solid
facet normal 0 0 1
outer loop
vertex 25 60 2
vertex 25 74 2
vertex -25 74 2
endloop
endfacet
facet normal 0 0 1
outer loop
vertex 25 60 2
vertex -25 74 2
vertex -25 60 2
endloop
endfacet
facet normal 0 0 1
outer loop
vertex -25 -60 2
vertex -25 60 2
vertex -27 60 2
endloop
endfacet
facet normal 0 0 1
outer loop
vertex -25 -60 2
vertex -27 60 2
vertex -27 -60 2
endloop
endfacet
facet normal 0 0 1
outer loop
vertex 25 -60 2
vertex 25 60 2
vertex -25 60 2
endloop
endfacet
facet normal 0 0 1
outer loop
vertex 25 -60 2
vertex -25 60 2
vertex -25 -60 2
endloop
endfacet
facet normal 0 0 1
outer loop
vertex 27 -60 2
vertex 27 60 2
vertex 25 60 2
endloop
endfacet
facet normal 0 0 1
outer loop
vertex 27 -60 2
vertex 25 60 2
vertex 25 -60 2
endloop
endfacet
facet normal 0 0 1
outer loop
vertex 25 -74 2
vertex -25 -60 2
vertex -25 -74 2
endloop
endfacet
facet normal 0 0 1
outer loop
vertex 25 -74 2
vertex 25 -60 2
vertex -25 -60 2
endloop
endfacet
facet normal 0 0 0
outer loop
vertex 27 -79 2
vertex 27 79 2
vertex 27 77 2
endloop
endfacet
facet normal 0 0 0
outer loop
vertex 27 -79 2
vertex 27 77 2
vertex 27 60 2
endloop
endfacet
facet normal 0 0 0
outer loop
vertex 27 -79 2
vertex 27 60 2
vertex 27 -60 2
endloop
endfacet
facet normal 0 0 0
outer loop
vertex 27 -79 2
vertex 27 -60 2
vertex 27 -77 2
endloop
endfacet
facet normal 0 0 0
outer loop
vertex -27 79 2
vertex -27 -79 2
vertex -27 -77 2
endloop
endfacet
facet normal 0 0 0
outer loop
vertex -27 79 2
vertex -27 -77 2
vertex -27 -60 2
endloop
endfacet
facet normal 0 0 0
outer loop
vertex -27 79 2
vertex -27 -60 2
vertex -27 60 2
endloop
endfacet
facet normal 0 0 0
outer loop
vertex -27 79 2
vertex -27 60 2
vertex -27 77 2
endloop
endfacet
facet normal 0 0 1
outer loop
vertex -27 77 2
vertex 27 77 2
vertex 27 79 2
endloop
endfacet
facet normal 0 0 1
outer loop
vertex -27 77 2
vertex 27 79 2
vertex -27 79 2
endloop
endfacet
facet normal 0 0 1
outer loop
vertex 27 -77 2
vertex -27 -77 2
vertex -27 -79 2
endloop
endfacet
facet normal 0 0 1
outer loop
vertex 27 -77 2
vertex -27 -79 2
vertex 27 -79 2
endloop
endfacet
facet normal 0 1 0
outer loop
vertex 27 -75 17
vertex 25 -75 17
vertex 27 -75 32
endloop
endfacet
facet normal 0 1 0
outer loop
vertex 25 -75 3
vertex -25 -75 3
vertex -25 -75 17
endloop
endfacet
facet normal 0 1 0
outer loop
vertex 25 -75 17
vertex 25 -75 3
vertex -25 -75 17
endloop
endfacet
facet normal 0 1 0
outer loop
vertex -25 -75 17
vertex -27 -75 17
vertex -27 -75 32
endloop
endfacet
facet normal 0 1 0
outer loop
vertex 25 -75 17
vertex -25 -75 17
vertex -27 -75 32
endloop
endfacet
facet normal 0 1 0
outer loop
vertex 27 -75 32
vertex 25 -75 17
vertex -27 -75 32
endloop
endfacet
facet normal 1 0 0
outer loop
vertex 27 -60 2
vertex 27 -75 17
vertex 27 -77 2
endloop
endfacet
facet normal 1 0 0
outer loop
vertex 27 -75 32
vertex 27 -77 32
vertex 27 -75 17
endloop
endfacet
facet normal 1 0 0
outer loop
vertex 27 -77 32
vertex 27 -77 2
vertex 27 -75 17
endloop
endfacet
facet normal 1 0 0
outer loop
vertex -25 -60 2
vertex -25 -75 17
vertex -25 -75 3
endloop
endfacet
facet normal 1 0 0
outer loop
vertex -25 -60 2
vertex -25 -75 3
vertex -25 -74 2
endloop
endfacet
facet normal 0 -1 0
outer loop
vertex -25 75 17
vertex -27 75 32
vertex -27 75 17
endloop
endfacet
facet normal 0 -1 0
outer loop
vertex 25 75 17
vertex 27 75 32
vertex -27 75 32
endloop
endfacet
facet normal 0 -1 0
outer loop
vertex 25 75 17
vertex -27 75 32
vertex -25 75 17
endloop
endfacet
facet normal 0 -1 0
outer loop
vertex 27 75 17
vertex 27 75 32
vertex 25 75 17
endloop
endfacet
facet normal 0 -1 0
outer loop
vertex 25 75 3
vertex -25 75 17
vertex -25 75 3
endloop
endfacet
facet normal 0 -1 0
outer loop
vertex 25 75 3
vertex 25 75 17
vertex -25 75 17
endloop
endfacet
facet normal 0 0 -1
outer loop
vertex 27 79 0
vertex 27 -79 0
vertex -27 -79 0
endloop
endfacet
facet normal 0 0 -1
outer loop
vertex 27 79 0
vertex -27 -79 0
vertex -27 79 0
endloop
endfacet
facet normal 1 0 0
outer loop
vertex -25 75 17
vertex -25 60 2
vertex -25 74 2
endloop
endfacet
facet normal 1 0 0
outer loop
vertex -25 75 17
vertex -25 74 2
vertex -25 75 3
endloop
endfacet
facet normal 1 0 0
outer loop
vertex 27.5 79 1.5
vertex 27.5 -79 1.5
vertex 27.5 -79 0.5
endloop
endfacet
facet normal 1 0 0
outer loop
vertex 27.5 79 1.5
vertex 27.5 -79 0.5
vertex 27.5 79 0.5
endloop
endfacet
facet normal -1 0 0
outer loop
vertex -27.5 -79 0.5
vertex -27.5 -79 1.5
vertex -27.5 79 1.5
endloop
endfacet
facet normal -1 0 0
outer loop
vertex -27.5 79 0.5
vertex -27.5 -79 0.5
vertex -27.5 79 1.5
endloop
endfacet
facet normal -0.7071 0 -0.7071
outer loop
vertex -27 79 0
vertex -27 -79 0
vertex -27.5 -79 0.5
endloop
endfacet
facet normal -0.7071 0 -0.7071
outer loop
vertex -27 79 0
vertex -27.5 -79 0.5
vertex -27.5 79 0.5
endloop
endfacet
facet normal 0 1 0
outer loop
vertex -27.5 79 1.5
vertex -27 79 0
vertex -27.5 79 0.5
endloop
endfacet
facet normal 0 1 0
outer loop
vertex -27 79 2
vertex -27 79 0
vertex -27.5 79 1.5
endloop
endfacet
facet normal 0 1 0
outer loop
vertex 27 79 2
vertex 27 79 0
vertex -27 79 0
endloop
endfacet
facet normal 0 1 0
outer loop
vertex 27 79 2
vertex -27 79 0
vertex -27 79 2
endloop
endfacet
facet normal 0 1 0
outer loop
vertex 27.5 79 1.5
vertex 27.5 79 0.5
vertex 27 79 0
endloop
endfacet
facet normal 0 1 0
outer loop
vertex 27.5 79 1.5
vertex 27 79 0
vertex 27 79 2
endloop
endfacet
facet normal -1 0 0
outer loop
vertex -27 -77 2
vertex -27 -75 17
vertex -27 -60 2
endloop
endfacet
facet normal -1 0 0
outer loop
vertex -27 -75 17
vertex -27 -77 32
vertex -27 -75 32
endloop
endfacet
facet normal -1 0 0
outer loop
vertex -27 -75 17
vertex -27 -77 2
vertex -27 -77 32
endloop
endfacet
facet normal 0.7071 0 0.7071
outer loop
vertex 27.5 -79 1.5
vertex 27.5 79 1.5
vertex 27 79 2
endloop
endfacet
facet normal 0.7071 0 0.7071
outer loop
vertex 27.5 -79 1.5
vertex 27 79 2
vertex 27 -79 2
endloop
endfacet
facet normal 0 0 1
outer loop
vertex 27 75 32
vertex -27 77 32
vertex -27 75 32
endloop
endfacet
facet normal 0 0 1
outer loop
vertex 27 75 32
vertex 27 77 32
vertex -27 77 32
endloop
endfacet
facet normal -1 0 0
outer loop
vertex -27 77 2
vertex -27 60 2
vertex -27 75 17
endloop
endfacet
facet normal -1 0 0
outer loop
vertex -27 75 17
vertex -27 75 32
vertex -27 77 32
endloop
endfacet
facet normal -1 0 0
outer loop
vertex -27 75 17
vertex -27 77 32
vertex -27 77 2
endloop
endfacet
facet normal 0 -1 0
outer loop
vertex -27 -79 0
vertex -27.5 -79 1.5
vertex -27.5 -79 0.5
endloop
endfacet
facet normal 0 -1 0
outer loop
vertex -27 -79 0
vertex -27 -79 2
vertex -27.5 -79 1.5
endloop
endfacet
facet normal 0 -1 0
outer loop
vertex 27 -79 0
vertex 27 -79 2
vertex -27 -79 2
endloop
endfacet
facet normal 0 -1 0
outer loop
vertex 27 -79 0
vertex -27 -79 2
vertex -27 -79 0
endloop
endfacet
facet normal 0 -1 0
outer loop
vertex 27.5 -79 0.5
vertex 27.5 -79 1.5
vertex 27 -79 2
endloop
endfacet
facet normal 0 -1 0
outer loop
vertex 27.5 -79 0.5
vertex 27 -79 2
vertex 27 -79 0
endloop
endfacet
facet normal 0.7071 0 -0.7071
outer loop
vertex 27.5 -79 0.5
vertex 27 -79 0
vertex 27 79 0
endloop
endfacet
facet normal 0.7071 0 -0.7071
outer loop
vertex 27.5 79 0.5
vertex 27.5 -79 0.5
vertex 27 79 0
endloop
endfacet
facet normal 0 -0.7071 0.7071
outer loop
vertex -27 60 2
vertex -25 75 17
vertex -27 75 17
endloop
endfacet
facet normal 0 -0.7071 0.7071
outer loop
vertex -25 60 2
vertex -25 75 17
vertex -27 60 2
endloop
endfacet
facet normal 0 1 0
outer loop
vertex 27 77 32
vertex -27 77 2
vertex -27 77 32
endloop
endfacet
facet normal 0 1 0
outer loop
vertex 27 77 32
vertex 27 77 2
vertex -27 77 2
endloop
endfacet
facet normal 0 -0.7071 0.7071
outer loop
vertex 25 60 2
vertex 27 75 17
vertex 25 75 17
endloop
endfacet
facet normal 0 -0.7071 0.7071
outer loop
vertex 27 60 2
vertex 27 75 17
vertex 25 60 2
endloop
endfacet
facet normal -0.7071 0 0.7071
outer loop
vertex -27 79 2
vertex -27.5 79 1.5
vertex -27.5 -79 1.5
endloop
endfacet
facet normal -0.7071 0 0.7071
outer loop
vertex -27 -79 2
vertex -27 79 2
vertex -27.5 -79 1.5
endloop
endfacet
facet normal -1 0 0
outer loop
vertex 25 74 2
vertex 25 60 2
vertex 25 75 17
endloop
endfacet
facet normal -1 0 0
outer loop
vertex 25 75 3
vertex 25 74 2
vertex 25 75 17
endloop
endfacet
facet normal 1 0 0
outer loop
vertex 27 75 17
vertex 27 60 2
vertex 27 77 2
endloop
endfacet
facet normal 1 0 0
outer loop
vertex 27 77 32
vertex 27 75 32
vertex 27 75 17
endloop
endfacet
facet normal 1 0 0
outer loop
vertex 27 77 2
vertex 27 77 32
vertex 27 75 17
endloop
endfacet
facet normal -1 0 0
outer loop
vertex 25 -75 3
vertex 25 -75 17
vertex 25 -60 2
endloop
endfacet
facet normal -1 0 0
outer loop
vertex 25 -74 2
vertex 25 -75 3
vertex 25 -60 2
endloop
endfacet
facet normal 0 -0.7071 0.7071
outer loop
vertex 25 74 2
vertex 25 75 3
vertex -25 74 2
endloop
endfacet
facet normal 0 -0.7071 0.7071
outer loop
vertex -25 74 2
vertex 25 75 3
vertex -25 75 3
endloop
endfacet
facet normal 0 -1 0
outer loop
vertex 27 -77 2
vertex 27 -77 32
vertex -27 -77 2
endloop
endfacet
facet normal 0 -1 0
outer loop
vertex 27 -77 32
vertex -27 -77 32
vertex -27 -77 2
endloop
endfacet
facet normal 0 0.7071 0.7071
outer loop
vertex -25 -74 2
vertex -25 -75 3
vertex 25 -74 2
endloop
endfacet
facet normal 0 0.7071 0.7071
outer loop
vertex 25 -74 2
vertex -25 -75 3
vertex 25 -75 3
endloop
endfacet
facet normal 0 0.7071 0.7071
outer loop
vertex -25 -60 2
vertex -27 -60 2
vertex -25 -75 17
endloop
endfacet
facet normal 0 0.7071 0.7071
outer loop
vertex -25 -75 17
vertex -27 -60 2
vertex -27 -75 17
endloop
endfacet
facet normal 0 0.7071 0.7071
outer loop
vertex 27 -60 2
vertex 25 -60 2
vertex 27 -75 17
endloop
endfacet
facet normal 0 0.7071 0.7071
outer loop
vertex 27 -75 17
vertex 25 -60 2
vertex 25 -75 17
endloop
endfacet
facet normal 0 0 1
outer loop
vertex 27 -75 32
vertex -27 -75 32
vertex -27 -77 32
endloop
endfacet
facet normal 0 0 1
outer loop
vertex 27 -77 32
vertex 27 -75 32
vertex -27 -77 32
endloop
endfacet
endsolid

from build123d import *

# Parameters (mm, degrees)
F4_DEPTH = 27.5
F5_DEPTH = 27
F6_DEPTH = 25
F7_SIZE  = 1
F8_SIZE  = 0.49999


# Not quite as in the source:
# - a fillet or chamfer is up to 0.001 mm smaller than in the source, because OpenCascade refuses the exact size


with BuildPart() as f4:
    # F3 (on Right) → F4 (new body, symmetric)
    with BuildSketch(Plane.YZ):
        Polygon((-75, 2), (-77, 2), (-79, 2), (-79, 0), (-77, 0), (0, 0), (77, 0), (79, 0), (79, 2), (77, 2), (75, 2), (60, 2), (0, 2), (-60, 2), align=None)
    extrude(amount=F4_DEPTH, both=True)

    # F3 (on Right) → F5 (join, symmetric)
    with BuildSketch(Plane.YZ):
        Polygon((-75, 32), (-77, 32), (-77, 2), (-75, 2), (-75, 17), align=None)
        Polygon((75, 32), (75, 17), (75, 2), (77, 2), (77, 32), align=None)
        Polygon((-75, 17), (-75, 2), (-60, 2), align=None)
        Polygon((75, 17), (60, 2), (75, 2), align=None)
    extrude(amount=F5_DEPTH, both=True)

    # F3 (on Right) → F6 (cut, symmetric)
    with BuildSketch(Plane.YZ):
        Polygon((-75, 17), (-75, 2), (-60, 2), align=None)
        Polygon((75, 17), (60, 2), (75, 2), align=None)
    extrude(amount=F6_DEPTH, both=True, mode=Mode.SUBTRACT)

    # F7
    f7_edges = [f4.edges().sort_by_distance(p)[0] for p in [
        (0, -75, 2),
        (0, 75, 2),
    ]]
    chamfer(f7_edges, length=F7_SIZE)

    # F8 (size 0.5 in the source; OpenCascade refuses exactly that, so slightly less here)
    f8_edges = [f4.edges().sort_by_distance(p)[0] for p in [
        (27.5, 0, 2),
        (27.5, 0, 0),
        (-27.5, 0, 2),
        (-27.5, 0, 0),
    ]]
    chamfer(f8_edges, length=F8_SIZE)


solid = f4.part
